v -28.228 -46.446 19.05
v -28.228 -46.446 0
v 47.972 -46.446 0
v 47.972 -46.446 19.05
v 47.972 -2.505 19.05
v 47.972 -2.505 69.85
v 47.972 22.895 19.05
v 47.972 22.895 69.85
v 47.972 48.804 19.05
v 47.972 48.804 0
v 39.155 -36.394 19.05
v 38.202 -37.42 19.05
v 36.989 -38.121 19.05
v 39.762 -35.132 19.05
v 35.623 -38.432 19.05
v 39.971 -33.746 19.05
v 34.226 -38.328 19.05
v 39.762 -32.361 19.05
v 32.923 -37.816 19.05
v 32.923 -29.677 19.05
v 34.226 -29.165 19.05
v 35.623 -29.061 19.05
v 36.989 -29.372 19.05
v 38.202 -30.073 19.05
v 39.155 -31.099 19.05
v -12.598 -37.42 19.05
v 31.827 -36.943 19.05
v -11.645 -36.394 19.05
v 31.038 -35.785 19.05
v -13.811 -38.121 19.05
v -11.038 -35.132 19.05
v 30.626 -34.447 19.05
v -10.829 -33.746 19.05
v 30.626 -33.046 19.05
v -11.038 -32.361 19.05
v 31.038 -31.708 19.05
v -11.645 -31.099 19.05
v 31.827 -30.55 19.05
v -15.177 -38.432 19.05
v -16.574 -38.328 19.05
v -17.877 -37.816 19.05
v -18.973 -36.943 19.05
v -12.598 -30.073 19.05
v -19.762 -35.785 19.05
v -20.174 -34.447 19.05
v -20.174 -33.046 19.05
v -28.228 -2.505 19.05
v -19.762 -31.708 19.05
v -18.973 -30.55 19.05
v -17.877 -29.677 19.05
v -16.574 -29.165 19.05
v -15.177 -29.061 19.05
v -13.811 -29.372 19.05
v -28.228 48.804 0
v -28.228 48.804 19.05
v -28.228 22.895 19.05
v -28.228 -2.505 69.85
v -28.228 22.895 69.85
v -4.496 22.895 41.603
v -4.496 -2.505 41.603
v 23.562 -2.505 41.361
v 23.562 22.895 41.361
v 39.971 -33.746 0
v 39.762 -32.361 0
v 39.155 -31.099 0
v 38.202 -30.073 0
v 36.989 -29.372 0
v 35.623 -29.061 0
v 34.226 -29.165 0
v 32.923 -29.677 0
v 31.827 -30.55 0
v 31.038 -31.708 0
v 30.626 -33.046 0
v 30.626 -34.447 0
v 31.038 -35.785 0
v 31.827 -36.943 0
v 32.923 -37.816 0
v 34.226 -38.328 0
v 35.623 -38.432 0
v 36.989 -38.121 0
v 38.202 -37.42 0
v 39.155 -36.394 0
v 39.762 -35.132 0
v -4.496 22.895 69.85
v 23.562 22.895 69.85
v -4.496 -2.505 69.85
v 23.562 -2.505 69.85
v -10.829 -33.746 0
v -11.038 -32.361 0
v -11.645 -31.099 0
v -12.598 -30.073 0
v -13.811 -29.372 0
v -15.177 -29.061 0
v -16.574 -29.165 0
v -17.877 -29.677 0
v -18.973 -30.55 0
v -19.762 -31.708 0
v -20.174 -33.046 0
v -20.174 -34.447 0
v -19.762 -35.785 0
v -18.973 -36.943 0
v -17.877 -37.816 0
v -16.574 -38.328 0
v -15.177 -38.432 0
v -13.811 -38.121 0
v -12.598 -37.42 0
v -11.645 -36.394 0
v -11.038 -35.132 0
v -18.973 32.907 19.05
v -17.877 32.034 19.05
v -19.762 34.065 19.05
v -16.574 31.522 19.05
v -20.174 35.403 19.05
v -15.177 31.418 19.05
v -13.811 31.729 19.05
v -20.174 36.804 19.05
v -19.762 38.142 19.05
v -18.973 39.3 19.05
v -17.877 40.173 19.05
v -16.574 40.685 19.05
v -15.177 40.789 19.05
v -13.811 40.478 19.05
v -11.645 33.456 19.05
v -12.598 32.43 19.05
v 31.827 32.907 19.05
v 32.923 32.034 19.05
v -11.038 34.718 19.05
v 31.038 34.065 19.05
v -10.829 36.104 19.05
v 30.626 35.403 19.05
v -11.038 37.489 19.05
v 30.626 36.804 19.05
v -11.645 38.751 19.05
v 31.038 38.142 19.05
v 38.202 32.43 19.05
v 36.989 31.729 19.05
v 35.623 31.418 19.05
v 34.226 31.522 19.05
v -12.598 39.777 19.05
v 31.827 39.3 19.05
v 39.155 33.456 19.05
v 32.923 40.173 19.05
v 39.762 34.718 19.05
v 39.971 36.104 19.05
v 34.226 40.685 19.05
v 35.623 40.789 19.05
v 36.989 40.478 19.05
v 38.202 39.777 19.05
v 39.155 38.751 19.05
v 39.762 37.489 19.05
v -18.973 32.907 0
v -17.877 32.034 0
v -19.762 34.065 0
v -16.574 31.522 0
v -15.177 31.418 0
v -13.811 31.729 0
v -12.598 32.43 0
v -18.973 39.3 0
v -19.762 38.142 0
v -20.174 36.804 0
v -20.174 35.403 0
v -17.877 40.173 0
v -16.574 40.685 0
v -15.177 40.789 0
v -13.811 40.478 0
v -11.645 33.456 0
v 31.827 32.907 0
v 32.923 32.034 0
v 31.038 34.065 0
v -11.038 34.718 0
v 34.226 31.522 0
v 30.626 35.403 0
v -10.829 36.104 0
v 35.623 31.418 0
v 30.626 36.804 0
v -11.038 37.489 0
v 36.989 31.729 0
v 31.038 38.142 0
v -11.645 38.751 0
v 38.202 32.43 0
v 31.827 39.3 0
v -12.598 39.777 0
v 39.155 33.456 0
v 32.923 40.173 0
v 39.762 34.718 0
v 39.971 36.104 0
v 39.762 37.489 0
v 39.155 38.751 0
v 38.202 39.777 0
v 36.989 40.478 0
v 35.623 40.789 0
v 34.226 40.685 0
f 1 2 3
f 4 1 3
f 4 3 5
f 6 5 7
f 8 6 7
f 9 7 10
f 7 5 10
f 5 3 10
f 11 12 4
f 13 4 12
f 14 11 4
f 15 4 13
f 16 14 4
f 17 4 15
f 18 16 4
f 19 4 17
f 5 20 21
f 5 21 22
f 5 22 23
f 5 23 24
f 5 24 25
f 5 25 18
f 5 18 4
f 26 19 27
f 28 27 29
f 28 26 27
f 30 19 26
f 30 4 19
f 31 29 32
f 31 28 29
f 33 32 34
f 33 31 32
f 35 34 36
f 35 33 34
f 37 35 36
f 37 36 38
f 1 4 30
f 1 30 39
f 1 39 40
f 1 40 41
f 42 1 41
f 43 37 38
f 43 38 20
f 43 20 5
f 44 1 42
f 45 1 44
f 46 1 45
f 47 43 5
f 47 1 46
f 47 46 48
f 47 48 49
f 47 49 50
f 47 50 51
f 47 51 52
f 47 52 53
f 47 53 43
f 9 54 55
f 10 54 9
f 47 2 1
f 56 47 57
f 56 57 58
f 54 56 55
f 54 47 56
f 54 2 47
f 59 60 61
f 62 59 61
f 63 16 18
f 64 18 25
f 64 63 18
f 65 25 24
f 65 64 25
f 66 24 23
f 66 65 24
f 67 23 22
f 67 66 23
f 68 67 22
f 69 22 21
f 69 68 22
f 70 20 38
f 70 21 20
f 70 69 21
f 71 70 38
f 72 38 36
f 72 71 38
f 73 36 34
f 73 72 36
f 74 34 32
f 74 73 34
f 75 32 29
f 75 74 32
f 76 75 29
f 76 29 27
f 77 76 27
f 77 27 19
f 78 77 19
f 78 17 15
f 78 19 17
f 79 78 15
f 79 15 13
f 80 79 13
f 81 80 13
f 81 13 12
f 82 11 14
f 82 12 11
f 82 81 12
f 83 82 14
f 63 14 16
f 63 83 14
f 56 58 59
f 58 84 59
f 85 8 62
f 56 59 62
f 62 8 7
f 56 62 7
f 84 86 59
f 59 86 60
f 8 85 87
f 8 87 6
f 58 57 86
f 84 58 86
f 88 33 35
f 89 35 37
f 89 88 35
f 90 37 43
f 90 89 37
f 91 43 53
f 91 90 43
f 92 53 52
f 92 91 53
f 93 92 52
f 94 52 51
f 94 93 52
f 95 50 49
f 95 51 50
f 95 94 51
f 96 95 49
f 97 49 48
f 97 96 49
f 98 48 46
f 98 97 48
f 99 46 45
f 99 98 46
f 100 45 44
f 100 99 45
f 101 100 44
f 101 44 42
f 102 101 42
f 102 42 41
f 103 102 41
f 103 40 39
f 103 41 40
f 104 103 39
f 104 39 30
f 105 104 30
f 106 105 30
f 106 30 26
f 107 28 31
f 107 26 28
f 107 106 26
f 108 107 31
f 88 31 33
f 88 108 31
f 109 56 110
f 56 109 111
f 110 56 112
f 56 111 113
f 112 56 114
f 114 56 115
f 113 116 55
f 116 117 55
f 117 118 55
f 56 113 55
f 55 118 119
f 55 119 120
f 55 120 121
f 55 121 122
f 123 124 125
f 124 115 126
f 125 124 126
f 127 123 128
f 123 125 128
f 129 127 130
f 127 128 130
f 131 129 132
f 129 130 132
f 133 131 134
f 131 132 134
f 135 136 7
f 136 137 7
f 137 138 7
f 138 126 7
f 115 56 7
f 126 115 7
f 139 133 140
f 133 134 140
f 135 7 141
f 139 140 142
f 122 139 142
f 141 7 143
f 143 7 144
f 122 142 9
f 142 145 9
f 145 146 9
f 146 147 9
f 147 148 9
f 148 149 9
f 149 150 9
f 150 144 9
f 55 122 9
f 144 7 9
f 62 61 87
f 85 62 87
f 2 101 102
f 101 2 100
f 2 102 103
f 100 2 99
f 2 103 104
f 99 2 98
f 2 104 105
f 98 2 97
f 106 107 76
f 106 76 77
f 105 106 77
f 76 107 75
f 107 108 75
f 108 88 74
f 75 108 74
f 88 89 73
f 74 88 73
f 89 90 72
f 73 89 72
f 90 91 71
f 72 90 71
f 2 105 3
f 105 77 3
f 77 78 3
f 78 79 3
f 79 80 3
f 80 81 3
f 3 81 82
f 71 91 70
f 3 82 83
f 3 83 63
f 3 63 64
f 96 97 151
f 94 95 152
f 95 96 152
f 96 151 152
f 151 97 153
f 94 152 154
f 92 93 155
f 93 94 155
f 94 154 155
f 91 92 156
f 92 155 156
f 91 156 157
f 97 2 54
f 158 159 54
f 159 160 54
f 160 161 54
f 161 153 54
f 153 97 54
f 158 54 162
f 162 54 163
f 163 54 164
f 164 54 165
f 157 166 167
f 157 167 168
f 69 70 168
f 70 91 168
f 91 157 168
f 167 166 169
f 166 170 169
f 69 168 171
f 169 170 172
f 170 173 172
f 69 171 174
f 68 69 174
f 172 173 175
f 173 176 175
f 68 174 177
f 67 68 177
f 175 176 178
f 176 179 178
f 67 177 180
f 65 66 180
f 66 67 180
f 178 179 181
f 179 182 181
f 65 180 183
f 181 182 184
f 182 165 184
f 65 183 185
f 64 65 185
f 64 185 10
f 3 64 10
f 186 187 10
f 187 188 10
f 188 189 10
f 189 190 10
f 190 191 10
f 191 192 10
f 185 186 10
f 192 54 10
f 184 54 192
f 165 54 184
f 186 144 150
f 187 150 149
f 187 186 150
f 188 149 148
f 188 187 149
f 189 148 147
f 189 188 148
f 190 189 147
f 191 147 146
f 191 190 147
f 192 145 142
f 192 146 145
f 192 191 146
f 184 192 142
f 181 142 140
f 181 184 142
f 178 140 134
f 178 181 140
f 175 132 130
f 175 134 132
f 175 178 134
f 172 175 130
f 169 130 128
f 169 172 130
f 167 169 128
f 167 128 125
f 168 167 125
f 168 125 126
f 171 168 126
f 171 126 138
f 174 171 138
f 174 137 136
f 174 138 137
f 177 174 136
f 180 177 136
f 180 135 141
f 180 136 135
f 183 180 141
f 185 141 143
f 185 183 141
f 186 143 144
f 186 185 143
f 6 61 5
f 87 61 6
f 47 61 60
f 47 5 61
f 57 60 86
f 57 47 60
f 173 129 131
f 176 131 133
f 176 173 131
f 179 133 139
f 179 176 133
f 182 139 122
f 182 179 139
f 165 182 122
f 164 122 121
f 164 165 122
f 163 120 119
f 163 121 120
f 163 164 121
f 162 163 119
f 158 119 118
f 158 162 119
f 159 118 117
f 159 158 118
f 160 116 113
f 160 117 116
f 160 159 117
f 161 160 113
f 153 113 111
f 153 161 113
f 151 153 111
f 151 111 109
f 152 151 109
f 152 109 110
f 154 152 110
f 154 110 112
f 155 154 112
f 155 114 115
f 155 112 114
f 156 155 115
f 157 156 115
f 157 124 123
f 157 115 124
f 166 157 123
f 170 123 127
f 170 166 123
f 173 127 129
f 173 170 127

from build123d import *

# Parameters (mm, degrees)
F0_W     = 76.2
F0_H     = 95.25
F1_DEPTH = 69.85
F3_DEPTH = 51.308
F4_W     = 44.45
F4_H     = 50.789239
F4_H_2   = 3.390253
F4_W_2   = 28.497008
F5_DEPTH = 133.35
F6_R     = 4.699
F7_DEPTH = 164.846


with BuildPart() as f1:
    # F0 (on Top) → F1 (new body)
    with BuildSketch(Plane.XY):
        with Locations((9.872094, 1.178516)):
            Rectangle(F0_W, F0_H)
    extrude(amount=F1_DEPTH)

    # F2 (on Front) → F3 (cut, symmetric)
    with BuildSketch(Plane.XZ):
        Polygon((23.562269, 41.361105), (23.562269, 69.936105), (-4.496123, 70.178263), (-4.496123, 41.603263), align=None)
    extrude(amount=F3_DEPTH, both=True, mode=Mode.SUBTRACT)

    # F4 (on Right) → F5 (cut, symmetric)
    with BuildSketch(Plane.YZ):
        with Locations((-24.730019, 44.444619)):
            Rectangle(F4_W, F4_H)
        Polygon((-52.010767, 19.05), (-46.955019, 19.05), (-46.955019, 69.839239), (-46.955019, 73.229492), (-52.010767, 73.229492), align=None)
        with Locations((-24.730019, 71.534365)):
            Rectangle(F4_W, F4_H_2)
        Polygon((51.391989, 69.839239), (22.894981, 69.839239), (22.894981, 19.05), (48.294981, 19.05), (51.391989, 19.05), align=None)
        with Locations((37.143485, 71.534365)):
            Rectangle(F4_W_2, F4_H_2)
    extrude(amount=F5_DEPTH, both=True, mode=Mode.SUBTRACT)

    # F6 (on Top) → F7 (cut)
    with BuildSketch(Plane.XY):
        with Locations((-15.527906, 36.103516)):
            Circle(F6_R)
        with Locations((35.272094, 36.103516)):
            Circle(F6_R)
        with Locations((-15.527906, -33.746484)):
            Circle(F6_R)
        with Locations((35.272094, -33.746484)):
            Circle(F6_R)
    extrude(amount=F7_DEPTH, mode=Mode.SUBTRACT)


solid = f1.part
